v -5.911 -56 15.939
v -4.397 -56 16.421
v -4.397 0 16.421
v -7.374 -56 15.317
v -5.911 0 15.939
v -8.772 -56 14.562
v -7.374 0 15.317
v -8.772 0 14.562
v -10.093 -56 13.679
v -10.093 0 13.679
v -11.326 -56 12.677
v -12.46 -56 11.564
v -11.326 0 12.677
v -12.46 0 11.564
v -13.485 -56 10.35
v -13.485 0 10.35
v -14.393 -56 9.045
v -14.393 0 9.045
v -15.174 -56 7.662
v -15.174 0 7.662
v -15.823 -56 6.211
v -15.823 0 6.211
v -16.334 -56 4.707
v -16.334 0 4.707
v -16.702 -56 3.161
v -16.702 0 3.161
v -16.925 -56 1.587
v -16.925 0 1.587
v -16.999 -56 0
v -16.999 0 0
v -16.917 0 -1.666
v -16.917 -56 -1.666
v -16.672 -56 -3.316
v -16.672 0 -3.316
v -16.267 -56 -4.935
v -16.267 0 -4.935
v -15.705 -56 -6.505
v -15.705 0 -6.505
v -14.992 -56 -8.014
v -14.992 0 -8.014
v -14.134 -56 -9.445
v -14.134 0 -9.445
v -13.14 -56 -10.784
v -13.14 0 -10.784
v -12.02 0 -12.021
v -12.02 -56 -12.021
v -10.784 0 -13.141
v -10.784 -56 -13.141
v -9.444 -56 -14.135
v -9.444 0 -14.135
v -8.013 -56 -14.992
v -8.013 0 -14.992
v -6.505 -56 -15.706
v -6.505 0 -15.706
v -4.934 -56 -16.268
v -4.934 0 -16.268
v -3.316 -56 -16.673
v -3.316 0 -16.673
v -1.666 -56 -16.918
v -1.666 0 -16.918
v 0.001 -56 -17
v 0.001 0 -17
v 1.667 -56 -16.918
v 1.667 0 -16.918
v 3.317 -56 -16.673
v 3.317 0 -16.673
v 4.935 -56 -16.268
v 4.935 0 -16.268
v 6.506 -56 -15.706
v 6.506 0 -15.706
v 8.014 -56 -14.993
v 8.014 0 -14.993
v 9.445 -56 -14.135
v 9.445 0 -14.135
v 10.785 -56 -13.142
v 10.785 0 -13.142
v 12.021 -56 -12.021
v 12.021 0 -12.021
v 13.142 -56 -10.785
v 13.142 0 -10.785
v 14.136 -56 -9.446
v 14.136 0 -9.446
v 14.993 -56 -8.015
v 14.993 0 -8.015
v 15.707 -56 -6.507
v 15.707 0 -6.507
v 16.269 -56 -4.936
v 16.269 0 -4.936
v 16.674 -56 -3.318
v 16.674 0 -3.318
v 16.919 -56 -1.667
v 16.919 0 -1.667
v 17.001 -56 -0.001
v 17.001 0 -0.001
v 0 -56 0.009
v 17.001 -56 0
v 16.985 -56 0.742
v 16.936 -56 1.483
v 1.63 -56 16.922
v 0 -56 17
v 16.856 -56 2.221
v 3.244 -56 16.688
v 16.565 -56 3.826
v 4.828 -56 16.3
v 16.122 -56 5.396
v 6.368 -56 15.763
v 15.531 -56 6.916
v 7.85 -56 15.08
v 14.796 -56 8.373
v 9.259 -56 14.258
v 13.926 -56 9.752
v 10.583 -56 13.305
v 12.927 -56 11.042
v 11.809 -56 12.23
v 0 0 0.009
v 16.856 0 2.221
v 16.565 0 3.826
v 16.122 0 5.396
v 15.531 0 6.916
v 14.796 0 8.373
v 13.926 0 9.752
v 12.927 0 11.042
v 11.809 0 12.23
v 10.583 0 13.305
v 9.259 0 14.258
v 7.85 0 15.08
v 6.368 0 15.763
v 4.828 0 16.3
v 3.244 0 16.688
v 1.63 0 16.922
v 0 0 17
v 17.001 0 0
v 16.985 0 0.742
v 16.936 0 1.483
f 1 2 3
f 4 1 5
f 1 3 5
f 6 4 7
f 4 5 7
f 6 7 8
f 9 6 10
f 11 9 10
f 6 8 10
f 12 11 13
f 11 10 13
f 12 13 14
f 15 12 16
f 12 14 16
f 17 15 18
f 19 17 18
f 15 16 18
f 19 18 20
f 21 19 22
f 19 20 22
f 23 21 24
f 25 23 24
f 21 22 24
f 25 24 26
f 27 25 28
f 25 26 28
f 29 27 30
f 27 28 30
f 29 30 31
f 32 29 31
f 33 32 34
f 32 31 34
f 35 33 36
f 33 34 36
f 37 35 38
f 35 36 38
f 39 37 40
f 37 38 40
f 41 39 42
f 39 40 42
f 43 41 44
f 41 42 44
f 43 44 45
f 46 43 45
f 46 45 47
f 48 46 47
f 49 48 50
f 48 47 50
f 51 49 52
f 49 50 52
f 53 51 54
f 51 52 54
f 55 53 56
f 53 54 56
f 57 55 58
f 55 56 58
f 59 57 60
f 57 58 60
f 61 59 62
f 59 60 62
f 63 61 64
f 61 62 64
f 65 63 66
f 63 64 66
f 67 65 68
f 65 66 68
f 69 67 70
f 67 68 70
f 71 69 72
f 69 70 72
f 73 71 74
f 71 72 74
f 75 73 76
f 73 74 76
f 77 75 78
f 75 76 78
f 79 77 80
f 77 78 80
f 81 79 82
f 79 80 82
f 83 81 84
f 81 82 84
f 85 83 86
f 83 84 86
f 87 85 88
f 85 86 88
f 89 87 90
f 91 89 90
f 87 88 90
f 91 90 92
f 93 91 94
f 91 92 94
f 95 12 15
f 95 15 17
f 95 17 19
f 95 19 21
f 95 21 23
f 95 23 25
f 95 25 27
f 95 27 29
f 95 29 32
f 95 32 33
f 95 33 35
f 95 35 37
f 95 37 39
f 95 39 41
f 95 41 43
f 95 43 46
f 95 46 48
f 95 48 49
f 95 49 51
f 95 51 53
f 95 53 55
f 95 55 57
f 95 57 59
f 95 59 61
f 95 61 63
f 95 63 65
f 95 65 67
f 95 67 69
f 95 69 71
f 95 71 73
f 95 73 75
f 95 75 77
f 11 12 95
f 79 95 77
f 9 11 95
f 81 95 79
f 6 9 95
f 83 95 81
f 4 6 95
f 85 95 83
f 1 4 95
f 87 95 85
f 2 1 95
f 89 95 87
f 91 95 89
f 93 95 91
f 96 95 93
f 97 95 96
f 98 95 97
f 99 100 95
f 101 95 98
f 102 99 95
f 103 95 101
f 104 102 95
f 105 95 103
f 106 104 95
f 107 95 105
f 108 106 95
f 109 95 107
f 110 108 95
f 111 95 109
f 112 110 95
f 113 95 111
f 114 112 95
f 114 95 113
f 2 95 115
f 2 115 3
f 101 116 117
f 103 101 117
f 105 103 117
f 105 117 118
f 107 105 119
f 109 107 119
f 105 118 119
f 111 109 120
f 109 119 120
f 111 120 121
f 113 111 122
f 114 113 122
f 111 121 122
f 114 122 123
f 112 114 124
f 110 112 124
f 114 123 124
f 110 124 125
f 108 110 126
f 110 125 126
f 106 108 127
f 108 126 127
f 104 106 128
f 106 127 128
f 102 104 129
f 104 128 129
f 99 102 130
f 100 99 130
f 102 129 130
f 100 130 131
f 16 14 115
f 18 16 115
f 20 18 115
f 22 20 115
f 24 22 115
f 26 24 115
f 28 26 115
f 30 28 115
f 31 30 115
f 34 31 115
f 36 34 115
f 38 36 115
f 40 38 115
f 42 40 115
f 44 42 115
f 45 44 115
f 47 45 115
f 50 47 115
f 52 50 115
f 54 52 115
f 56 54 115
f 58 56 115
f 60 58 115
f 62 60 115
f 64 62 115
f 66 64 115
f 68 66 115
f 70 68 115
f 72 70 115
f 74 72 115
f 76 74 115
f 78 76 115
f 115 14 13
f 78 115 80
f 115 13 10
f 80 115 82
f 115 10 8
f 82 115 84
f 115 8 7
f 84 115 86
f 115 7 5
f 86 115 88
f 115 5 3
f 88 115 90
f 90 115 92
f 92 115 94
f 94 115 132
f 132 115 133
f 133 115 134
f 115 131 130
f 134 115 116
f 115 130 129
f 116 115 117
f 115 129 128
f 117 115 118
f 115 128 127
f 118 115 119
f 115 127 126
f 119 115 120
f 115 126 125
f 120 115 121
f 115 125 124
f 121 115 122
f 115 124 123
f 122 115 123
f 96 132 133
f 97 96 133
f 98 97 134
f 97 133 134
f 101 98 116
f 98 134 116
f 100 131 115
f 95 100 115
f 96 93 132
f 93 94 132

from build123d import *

# Parameters (mm, degrees)
F1_DEPTH = 56
F3_DEPTH = 56


# Not quite as in the source:
# - a feature of the source that left no trace in its solid (it failed there, or was rolled back) is left out
# - a feature names something its author has since deleted; it is built from what else it names


with BuildPart() as f1:
    # F0 (on Front) → F1 (new body)
    with BuildSketch(Plane.XZ):
        with BuildLine():
            ThreePointArc((17.0012298637, -0.0012299217), (17.0012298971, -0.0006149604), (17.0012299082, 8e-10))
            ThreePointArc((17.0012299082, 8e-10), (16.9647599435, 1.1129459753), (16.8555065268, 2.2211167615))
            Line((16.8555065268, 2.2211167615), (0.0018881159, 0.0022958043))
            Line((0.0018881159, 0.0022958043), (0.0009440615, 0.0021715172))
            Line((0.0009440615, 0.0021715172), (0.0012299082, 8e-10))
            Line((0.0012299082, 8e-10), (6.4e-09, 8e-10))
            Line((-3.33e-08, 8e-10), (-5.49e-08, -0.0012299217))
            Line((-5.49e-08, -0.0012299217), (17.0012298637, -0.0012299217))
        make_face()
        with BuildLine():
            Line((0.0018881159, 0.0022958043), (16.8555065268, 2.2211167615))
            ThreePointArc((16.8555065268, 2.2211167615), (11.2089354185, 12.7823056298), (0.0002990162, 16.9999999754))
            Line((0.0002990162, 16.9999999754), (1.31e-07, 0.0093423556))
            Line((1.31e-07, 0.0093423556), (0.0018881159, 0.0022958043))
        make_face()
        with BuildLine():
            ThreePointArc((-16.9987700918, 8e-10), (0.0006149469, -16.999999988), (17.0012298637, -0.0012299217))
            Line((17.0012298637, -0.0012299217), (-5.49e-08, -0.0012299217))
            Line((-5.49e-08, -0.0012299217), (-3.33e-08, 8e-10))
            Line((-3.33e-08, 8e-10), (2.7e-09, 0.0020472295))
            Line((2.7e-09, 0.0020472295), (1.31e-07, 0.0093423556))
            Line((1.31e-07, 0.0093423556), (-4.3972169489, 16.4211347133))
            ThreePointArc((-4.3972169489, 16.4211347133), (-13.4853114678, 10.3495507986), (-16.9987700918, 8e-10))
        make_face()
        Polygon((0.0009440615, 0.0021715172), (0.0018881159, 0.0022958043), (1.31e-07, 0.0093423556), align=None)
        Polygon((0.0009440615, 0.0021715172), (1.31e-07, 0.0093423556), (2.7e-09, 0.0020472295), align=None)
        Polygon((0.0012299082, 8e-10), (0.0009440615, 0.0021715172), (2.7e-09, 0.0020472295), (-3.33e-08, 8e-10), align=None)
    extrude(amount=F1_DEPTH)

    # F0 (on Front) → F3 (cut)
    with BuildSketch(Plane.XZ):
        with BuildLine():
            Line((1.31e-07, 0.0093423556), (0.0002990162, 16.9999999754))
            ThreePointArc((0.0002990162, 16.9999999754), (-1.1109385334, 16.9635810307), (-2.2174188682, 16.8546016754))
            Line((-2.2174188682, 16.8546016754), (1.31e-07, 0.0093423556))
        make_face()
        with BuildLine():
            Line((1.31e-07, 0.0093423556), (-2.2174188682, 16.8546016754))
            ThreePointArc((-2.2174188682, 16.8546016754), (-3.3144091037, 16.6735280601), (-4.3972169489, 16.4211347133))
            Line((-4.3972169489, 16.4211347133), (1.31e-07, 0.0093423556))
        make_face()
    extrude(amount=F3_DEPTH, mode=Mode.SUBTRACT)


solid = f1.part
